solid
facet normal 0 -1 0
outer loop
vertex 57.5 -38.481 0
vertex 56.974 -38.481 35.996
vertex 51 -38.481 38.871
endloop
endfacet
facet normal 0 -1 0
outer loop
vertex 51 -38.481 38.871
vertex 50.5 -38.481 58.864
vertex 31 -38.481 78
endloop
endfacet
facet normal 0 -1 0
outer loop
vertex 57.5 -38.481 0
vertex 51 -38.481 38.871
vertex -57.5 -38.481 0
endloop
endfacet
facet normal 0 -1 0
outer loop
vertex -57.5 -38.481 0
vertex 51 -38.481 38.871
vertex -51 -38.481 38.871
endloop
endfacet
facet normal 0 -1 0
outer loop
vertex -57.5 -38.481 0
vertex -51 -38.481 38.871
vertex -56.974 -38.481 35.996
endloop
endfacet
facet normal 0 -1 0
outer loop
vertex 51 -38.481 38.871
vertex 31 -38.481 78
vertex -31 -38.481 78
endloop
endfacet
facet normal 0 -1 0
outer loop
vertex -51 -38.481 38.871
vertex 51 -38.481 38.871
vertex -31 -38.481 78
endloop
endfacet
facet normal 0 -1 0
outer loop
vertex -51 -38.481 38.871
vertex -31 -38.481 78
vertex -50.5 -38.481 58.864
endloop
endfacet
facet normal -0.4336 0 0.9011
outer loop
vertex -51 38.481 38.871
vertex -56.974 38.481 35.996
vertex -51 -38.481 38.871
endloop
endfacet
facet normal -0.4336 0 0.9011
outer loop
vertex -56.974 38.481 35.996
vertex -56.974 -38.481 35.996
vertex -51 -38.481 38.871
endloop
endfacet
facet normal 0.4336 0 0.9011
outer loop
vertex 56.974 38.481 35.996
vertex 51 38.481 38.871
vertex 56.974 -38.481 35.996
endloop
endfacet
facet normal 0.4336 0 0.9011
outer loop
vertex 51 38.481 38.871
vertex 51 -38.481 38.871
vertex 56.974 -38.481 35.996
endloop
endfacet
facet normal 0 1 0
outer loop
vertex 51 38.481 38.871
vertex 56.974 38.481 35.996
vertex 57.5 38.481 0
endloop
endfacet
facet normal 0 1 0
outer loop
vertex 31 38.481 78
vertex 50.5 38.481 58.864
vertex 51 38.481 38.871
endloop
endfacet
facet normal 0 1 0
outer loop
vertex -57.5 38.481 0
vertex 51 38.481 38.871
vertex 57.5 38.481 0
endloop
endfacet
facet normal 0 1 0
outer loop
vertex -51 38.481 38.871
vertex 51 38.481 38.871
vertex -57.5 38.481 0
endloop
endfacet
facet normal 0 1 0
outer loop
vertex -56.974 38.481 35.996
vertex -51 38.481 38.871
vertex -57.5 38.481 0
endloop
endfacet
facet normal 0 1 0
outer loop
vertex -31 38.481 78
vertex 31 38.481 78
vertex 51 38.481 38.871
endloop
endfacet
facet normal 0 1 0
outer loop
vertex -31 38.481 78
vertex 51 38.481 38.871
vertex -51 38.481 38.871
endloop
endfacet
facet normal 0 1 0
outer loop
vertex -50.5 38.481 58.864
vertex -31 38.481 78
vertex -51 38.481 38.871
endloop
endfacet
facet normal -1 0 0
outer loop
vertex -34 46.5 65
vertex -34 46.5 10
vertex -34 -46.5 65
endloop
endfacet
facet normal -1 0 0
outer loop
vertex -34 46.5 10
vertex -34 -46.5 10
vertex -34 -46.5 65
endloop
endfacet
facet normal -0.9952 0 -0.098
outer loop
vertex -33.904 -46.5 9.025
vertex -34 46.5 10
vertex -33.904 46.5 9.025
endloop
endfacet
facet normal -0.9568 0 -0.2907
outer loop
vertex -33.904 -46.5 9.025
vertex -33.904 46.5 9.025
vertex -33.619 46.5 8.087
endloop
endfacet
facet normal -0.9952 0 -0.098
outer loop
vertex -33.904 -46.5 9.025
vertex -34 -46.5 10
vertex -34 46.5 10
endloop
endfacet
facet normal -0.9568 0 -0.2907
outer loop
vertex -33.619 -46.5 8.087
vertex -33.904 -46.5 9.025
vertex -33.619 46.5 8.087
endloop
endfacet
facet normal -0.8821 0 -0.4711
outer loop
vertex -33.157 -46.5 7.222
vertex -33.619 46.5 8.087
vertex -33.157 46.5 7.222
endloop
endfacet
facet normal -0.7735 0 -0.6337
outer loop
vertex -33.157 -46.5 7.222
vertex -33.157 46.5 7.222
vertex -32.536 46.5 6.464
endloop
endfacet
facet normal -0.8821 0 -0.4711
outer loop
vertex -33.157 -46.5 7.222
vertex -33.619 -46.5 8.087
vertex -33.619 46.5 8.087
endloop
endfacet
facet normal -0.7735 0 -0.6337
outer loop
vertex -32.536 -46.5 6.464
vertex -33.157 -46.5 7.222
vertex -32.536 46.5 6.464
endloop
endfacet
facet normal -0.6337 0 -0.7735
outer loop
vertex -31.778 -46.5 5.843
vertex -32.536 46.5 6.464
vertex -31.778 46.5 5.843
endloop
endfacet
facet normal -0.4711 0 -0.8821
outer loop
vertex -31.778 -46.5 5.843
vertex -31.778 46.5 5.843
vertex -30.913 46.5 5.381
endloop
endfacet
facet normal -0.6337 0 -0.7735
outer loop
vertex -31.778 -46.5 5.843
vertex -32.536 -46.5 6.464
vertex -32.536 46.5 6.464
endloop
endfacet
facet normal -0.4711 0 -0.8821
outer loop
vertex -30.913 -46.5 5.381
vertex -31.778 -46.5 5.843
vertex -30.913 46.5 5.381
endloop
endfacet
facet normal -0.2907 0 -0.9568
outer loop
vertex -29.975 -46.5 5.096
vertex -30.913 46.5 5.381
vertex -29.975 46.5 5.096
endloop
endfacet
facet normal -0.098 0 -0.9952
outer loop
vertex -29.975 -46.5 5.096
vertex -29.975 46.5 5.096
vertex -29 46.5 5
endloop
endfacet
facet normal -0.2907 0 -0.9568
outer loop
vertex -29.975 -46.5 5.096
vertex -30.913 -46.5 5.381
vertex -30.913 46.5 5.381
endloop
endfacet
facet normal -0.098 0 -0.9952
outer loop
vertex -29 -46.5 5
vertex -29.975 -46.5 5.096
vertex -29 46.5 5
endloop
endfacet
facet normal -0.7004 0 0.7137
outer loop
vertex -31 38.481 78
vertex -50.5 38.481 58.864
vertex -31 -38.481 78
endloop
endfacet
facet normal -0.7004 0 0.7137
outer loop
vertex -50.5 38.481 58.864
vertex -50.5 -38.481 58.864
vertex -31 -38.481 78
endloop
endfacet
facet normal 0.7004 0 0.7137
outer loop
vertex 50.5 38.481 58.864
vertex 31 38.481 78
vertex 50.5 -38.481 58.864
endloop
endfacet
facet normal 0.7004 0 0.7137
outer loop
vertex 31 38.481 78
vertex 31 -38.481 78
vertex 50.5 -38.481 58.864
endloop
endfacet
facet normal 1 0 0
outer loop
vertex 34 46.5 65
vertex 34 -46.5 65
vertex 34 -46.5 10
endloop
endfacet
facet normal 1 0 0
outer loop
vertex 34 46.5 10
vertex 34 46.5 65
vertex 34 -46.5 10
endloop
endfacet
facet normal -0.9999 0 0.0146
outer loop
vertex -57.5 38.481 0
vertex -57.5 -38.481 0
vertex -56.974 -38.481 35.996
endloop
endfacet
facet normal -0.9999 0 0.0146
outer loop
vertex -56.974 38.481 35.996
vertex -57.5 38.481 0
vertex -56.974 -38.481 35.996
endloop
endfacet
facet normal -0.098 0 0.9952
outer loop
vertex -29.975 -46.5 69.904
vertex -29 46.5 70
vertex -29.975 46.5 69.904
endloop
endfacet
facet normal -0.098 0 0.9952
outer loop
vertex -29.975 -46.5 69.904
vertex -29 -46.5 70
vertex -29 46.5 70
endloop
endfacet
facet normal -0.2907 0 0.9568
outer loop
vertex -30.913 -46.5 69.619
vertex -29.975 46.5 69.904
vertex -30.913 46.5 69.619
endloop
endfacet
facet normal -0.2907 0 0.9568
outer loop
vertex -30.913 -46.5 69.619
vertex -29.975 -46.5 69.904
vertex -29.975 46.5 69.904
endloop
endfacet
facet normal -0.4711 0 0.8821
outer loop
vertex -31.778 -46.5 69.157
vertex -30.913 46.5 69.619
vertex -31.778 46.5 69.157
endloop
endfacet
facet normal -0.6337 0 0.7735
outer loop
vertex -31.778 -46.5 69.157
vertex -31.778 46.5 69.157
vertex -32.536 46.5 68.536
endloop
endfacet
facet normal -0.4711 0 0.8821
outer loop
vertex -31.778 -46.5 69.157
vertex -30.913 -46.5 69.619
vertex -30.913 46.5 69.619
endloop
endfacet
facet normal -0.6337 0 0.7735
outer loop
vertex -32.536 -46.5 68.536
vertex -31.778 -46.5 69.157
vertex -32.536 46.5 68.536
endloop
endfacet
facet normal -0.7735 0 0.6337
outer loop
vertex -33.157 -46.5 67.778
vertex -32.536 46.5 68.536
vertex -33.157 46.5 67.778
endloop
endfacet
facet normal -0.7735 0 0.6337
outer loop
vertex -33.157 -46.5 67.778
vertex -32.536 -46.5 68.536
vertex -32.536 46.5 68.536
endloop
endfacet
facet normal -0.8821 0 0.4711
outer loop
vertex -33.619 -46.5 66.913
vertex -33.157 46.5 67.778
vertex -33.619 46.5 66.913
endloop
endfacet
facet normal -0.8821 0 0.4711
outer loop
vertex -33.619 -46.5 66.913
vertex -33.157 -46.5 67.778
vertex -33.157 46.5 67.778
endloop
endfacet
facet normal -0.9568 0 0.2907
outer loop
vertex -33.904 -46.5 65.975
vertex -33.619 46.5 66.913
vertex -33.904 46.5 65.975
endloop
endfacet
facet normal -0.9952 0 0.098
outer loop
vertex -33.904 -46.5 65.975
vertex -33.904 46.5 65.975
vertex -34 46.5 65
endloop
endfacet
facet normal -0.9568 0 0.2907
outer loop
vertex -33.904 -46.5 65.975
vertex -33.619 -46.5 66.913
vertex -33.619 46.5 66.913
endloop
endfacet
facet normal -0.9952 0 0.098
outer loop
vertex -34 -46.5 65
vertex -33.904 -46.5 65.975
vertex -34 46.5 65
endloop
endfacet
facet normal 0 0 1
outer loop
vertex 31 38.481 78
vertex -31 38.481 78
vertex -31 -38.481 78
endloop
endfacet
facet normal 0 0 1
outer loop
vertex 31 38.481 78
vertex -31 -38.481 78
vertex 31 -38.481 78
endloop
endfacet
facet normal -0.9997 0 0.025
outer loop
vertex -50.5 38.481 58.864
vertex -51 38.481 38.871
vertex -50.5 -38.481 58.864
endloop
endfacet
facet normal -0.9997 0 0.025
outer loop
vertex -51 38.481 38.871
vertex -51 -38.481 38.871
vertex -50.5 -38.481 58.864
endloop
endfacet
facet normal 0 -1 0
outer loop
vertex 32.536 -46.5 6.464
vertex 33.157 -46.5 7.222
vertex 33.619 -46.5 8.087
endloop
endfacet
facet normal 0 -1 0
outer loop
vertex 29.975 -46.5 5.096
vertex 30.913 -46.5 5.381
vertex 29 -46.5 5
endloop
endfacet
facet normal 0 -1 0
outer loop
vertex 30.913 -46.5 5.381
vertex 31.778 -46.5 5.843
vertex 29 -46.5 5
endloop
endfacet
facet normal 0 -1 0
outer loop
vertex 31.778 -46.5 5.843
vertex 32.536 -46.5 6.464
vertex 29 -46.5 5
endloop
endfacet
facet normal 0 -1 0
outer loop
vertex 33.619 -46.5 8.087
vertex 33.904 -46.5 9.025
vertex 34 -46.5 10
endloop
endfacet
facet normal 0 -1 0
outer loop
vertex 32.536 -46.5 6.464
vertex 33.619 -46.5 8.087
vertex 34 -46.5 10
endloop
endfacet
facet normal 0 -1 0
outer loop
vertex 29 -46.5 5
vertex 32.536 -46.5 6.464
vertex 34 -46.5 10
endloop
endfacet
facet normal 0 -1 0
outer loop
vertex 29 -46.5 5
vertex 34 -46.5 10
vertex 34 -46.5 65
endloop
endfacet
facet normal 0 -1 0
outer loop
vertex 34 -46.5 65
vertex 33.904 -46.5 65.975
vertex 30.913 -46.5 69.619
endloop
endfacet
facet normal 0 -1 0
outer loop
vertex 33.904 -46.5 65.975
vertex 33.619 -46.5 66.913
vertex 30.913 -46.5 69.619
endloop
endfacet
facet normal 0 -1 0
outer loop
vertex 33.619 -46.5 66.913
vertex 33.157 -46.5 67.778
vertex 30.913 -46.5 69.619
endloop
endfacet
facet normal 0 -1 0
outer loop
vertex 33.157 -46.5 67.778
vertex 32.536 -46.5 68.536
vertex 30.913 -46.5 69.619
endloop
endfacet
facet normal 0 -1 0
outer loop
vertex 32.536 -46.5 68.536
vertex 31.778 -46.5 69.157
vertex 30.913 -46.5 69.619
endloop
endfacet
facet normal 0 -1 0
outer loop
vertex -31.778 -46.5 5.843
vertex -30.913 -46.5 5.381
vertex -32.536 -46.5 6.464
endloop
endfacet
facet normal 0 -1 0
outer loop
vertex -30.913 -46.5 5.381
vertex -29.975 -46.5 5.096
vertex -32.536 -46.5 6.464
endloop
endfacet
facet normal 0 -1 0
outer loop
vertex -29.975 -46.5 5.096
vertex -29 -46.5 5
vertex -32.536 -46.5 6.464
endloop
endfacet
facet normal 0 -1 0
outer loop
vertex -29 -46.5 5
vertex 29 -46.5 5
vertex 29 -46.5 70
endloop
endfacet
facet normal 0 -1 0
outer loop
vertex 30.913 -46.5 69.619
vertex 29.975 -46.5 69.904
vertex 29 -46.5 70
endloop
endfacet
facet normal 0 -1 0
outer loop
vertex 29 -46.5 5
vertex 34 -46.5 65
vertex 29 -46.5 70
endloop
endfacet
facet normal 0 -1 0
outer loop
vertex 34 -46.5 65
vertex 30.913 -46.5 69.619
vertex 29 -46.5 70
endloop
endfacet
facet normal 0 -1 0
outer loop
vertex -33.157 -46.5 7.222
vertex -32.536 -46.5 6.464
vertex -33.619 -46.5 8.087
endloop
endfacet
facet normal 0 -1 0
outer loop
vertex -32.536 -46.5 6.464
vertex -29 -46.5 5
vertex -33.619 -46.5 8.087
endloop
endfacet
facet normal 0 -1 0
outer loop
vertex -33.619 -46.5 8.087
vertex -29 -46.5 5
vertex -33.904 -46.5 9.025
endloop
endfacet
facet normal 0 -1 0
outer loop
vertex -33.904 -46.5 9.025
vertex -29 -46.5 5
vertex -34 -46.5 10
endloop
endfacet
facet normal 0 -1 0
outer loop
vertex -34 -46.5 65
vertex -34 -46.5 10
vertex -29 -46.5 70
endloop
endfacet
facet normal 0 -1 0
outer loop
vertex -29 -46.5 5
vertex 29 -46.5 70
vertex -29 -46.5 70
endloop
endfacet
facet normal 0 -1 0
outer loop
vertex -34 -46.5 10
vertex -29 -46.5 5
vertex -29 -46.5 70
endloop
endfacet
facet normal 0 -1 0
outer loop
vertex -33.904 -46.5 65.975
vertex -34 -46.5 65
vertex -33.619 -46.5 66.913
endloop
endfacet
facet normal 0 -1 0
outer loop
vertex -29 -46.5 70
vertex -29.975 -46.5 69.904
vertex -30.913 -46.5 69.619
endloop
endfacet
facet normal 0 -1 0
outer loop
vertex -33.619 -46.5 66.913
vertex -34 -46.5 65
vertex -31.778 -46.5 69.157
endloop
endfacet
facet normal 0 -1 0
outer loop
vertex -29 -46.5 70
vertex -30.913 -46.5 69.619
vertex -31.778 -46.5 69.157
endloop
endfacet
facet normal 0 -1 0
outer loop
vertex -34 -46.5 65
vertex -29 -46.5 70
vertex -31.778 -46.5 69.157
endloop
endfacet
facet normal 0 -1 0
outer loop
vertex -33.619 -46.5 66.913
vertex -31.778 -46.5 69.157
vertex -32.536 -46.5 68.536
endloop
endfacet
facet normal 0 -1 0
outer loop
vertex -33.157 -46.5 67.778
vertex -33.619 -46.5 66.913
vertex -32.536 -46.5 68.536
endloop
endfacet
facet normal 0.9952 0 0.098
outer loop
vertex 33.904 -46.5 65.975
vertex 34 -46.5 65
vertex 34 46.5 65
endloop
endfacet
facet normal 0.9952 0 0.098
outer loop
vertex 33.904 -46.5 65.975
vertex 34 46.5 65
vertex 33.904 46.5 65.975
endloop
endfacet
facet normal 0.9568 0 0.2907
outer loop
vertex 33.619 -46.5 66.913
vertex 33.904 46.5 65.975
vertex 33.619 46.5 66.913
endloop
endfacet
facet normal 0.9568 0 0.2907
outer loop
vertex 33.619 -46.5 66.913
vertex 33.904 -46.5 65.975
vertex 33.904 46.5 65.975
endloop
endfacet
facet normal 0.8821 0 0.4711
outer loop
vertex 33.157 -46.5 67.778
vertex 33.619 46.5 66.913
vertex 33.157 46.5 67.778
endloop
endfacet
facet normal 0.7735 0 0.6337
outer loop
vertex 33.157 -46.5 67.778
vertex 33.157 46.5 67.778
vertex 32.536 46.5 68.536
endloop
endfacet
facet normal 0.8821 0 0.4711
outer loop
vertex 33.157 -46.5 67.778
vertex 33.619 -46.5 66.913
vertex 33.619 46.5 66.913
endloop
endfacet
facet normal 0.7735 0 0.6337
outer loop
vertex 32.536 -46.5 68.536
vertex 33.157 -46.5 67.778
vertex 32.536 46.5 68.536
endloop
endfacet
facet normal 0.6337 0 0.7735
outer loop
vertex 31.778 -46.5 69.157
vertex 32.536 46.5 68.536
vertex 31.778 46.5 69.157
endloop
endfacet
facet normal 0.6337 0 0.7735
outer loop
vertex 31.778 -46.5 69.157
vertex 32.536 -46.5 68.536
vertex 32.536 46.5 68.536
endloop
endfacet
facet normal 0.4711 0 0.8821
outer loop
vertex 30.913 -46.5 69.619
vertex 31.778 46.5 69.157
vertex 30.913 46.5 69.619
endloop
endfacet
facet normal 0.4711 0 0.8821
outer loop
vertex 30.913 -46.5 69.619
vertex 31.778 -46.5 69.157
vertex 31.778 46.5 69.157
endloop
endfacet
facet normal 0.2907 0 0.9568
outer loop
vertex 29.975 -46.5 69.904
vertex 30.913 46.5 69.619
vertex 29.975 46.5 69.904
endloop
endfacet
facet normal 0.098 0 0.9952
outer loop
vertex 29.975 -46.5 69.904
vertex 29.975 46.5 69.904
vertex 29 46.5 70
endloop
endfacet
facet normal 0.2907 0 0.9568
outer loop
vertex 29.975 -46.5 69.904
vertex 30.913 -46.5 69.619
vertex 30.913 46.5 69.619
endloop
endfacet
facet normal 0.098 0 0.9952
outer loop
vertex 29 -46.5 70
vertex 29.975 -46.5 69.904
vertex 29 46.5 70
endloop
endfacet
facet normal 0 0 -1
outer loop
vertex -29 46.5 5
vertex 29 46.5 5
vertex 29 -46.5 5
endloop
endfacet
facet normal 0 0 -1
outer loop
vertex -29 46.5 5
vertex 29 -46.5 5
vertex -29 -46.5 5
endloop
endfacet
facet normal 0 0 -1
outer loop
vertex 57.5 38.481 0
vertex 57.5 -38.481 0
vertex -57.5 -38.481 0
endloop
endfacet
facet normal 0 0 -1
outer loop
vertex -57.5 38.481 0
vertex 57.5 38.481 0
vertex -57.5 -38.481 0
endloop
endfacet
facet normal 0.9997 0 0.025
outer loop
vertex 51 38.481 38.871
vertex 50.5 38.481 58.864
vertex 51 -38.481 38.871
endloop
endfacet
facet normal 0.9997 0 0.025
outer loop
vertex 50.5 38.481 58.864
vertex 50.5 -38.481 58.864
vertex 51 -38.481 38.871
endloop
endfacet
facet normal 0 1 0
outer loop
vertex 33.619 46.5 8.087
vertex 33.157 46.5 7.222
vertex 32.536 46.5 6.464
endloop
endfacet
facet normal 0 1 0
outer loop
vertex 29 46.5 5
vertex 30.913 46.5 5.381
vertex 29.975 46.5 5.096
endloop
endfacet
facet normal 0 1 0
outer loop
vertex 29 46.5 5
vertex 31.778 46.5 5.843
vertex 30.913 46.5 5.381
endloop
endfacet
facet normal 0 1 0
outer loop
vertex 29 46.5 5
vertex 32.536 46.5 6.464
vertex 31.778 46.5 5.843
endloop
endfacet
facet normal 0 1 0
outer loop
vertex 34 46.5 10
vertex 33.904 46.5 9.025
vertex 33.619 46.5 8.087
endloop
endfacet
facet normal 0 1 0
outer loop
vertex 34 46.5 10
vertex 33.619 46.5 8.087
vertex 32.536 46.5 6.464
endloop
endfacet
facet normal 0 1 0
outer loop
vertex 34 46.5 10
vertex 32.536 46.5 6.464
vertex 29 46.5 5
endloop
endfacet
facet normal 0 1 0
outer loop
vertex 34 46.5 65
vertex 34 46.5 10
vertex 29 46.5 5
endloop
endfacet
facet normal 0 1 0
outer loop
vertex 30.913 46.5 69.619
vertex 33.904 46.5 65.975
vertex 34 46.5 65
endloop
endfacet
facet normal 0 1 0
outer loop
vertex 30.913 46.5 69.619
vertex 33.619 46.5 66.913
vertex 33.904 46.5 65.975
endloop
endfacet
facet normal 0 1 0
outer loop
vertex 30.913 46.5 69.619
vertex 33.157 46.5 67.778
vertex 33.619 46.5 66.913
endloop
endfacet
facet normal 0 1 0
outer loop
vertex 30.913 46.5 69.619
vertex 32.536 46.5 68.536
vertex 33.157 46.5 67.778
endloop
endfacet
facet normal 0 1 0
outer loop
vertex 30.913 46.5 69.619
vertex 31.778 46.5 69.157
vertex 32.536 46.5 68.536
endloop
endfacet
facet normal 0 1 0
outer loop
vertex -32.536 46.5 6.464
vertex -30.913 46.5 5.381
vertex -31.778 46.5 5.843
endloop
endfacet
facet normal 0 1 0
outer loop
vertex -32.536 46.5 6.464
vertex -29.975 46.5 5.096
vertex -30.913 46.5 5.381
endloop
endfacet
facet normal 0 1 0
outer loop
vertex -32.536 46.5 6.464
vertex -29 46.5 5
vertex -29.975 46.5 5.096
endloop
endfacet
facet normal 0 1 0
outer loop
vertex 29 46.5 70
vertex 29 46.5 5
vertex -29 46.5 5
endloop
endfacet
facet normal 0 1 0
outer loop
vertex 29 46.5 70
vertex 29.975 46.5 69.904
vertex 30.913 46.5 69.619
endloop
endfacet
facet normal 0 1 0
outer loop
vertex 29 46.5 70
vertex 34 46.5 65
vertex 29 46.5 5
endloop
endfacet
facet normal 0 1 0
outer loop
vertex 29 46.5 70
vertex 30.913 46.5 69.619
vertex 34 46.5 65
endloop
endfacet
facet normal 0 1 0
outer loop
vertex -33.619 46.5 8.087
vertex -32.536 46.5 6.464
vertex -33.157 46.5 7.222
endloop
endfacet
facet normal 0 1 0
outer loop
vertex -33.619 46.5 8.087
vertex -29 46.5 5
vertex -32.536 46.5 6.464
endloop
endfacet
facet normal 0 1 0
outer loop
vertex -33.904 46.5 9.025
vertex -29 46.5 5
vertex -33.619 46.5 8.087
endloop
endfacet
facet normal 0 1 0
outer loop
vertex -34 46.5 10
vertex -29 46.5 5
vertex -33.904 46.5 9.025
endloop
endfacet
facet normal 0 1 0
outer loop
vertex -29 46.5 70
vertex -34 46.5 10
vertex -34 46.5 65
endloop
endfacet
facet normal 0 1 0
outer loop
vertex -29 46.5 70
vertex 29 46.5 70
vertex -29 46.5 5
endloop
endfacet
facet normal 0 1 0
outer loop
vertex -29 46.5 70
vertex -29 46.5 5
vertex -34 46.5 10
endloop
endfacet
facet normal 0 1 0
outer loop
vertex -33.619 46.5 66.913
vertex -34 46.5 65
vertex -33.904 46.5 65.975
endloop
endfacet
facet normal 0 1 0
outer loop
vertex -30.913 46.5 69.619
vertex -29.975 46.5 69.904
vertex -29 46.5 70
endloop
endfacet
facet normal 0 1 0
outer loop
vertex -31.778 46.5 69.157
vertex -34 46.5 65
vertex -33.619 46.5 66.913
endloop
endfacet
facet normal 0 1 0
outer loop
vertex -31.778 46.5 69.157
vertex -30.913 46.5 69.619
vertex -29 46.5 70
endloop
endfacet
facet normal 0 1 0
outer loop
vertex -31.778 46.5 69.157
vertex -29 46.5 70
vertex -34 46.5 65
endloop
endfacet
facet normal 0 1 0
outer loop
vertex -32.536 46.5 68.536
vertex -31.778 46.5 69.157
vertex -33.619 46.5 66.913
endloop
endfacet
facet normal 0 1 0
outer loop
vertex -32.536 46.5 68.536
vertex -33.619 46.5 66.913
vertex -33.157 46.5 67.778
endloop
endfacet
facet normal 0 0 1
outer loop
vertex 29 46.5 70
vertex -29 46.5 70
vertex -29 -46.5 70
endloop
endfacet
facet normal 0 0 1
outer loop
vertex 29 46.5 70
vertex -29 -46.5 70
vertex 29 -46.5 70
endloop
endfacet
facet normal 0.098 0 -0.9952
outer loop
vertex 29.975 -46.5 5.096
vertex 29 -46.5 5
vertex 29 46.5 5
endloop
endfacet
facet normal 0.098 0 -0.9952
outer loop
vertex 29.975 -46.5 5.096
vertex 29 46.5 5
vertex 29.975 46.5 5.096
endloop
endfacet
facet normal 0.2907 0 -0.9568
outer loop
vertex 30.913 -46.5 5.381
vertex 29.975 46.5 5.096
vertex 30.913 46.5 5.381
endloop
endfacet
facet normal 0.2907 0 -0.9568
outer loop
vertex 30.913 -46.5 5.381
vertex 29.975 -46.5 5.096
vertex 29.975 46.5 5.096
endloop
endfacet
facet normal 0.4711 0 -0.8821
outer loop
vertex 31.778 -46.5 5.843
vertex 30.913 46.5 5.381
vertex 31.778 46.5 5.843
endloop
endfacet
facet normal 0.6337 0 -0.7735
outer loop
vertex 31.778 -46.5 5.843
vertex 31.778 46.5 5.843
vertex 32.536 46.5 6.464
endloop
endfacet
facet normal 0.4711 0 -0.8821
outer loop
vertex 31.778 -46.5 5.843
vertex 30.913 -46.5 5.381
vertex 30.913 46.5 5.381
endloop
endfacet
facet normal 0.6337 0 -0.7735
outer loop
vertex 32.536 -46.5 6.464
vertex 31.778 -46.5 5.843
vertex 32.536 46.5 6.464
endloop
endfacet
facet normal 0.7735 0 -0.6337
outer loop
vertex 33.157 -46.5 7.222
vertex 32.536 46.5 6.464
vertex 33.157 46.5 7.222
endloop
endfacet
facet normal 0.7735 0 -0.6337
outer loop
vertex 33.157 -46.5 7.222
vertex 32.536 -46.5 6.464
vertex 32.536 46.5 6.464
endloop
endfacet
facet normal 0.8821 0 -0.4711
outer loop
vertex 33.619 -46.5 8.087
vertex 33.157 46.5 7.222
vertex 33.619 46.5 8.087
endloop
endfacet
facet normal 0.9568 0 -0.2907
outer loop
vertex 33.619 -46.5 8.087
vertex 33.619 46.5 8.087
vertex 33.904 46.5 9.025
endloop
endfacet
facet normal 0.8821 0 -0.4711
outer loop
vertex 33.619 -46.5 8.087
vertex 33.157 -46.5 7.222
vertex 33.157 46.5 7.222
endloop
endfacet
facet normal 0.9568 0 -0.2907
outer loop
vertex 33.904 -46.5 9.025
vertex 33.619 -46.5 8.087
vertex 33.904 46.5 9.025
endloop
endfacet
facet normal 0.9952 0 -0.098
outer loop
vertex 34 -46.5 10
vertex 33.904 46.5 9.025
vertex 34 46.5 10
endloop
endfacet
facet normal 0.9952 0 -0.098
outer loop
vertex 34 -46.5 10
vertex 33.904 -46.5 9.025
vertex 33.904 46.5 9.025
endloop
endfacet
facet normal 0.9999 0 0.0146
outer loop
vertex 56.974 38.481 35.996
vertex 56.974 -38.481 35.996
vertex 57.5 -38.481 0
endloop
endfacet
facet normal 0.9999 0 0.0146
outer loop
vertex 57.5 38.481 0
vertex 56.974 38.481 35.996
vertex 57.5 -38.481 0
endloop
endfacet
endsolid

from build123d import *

# Parameters (mm, degrees)
PAD_DEPTH    = 38.481
PAD003_DEPTH = 46.5


with BuildPart() as body:
    # Sketch → Pad (new body, symmetric)
    with BuildSketch(Plane.XZ):
        Polygon((-57.5, 0), (-56.973913, 35.996156), (-51, 38.870502), (-50.5, 58.864251), (-31, 78), (31, 78), (50.5, 58.864251), (51, 38.870502), (56.973913, 35.996156), (57.5, 0), align=None)
    extrude(amount=PAD_DEPTH, both=True)


with BuildPart() as body001:
    # Sketch003 → Pad003 (new body, symmetric)
    with BuildSketch(Plane.XZ):
        with BuildLine():
            Line((29, 5), (-29, 5))
            ThreePointArc((-34, 10), (-32.535534, 6.464466), (-29, 5))
            Line((-34, 10), (-34, 65))
            ThreePointArc((-29, 70), (-32.535534, 68.535534), (-34, 65))
            Line((-29, 70), (29, 70))
            ThreePointArc((34, 65), (32.535534, 68.535534), (29, 70))
            Line((34, 65), (34, 10))
            ThreePointArc((29, 5), (32.535534, 6.464466), (34, 10))
        make_face()
    extrude(amount=PAD003_DEPTH, both=True)


solid = Compound([body.part, body001.part])
